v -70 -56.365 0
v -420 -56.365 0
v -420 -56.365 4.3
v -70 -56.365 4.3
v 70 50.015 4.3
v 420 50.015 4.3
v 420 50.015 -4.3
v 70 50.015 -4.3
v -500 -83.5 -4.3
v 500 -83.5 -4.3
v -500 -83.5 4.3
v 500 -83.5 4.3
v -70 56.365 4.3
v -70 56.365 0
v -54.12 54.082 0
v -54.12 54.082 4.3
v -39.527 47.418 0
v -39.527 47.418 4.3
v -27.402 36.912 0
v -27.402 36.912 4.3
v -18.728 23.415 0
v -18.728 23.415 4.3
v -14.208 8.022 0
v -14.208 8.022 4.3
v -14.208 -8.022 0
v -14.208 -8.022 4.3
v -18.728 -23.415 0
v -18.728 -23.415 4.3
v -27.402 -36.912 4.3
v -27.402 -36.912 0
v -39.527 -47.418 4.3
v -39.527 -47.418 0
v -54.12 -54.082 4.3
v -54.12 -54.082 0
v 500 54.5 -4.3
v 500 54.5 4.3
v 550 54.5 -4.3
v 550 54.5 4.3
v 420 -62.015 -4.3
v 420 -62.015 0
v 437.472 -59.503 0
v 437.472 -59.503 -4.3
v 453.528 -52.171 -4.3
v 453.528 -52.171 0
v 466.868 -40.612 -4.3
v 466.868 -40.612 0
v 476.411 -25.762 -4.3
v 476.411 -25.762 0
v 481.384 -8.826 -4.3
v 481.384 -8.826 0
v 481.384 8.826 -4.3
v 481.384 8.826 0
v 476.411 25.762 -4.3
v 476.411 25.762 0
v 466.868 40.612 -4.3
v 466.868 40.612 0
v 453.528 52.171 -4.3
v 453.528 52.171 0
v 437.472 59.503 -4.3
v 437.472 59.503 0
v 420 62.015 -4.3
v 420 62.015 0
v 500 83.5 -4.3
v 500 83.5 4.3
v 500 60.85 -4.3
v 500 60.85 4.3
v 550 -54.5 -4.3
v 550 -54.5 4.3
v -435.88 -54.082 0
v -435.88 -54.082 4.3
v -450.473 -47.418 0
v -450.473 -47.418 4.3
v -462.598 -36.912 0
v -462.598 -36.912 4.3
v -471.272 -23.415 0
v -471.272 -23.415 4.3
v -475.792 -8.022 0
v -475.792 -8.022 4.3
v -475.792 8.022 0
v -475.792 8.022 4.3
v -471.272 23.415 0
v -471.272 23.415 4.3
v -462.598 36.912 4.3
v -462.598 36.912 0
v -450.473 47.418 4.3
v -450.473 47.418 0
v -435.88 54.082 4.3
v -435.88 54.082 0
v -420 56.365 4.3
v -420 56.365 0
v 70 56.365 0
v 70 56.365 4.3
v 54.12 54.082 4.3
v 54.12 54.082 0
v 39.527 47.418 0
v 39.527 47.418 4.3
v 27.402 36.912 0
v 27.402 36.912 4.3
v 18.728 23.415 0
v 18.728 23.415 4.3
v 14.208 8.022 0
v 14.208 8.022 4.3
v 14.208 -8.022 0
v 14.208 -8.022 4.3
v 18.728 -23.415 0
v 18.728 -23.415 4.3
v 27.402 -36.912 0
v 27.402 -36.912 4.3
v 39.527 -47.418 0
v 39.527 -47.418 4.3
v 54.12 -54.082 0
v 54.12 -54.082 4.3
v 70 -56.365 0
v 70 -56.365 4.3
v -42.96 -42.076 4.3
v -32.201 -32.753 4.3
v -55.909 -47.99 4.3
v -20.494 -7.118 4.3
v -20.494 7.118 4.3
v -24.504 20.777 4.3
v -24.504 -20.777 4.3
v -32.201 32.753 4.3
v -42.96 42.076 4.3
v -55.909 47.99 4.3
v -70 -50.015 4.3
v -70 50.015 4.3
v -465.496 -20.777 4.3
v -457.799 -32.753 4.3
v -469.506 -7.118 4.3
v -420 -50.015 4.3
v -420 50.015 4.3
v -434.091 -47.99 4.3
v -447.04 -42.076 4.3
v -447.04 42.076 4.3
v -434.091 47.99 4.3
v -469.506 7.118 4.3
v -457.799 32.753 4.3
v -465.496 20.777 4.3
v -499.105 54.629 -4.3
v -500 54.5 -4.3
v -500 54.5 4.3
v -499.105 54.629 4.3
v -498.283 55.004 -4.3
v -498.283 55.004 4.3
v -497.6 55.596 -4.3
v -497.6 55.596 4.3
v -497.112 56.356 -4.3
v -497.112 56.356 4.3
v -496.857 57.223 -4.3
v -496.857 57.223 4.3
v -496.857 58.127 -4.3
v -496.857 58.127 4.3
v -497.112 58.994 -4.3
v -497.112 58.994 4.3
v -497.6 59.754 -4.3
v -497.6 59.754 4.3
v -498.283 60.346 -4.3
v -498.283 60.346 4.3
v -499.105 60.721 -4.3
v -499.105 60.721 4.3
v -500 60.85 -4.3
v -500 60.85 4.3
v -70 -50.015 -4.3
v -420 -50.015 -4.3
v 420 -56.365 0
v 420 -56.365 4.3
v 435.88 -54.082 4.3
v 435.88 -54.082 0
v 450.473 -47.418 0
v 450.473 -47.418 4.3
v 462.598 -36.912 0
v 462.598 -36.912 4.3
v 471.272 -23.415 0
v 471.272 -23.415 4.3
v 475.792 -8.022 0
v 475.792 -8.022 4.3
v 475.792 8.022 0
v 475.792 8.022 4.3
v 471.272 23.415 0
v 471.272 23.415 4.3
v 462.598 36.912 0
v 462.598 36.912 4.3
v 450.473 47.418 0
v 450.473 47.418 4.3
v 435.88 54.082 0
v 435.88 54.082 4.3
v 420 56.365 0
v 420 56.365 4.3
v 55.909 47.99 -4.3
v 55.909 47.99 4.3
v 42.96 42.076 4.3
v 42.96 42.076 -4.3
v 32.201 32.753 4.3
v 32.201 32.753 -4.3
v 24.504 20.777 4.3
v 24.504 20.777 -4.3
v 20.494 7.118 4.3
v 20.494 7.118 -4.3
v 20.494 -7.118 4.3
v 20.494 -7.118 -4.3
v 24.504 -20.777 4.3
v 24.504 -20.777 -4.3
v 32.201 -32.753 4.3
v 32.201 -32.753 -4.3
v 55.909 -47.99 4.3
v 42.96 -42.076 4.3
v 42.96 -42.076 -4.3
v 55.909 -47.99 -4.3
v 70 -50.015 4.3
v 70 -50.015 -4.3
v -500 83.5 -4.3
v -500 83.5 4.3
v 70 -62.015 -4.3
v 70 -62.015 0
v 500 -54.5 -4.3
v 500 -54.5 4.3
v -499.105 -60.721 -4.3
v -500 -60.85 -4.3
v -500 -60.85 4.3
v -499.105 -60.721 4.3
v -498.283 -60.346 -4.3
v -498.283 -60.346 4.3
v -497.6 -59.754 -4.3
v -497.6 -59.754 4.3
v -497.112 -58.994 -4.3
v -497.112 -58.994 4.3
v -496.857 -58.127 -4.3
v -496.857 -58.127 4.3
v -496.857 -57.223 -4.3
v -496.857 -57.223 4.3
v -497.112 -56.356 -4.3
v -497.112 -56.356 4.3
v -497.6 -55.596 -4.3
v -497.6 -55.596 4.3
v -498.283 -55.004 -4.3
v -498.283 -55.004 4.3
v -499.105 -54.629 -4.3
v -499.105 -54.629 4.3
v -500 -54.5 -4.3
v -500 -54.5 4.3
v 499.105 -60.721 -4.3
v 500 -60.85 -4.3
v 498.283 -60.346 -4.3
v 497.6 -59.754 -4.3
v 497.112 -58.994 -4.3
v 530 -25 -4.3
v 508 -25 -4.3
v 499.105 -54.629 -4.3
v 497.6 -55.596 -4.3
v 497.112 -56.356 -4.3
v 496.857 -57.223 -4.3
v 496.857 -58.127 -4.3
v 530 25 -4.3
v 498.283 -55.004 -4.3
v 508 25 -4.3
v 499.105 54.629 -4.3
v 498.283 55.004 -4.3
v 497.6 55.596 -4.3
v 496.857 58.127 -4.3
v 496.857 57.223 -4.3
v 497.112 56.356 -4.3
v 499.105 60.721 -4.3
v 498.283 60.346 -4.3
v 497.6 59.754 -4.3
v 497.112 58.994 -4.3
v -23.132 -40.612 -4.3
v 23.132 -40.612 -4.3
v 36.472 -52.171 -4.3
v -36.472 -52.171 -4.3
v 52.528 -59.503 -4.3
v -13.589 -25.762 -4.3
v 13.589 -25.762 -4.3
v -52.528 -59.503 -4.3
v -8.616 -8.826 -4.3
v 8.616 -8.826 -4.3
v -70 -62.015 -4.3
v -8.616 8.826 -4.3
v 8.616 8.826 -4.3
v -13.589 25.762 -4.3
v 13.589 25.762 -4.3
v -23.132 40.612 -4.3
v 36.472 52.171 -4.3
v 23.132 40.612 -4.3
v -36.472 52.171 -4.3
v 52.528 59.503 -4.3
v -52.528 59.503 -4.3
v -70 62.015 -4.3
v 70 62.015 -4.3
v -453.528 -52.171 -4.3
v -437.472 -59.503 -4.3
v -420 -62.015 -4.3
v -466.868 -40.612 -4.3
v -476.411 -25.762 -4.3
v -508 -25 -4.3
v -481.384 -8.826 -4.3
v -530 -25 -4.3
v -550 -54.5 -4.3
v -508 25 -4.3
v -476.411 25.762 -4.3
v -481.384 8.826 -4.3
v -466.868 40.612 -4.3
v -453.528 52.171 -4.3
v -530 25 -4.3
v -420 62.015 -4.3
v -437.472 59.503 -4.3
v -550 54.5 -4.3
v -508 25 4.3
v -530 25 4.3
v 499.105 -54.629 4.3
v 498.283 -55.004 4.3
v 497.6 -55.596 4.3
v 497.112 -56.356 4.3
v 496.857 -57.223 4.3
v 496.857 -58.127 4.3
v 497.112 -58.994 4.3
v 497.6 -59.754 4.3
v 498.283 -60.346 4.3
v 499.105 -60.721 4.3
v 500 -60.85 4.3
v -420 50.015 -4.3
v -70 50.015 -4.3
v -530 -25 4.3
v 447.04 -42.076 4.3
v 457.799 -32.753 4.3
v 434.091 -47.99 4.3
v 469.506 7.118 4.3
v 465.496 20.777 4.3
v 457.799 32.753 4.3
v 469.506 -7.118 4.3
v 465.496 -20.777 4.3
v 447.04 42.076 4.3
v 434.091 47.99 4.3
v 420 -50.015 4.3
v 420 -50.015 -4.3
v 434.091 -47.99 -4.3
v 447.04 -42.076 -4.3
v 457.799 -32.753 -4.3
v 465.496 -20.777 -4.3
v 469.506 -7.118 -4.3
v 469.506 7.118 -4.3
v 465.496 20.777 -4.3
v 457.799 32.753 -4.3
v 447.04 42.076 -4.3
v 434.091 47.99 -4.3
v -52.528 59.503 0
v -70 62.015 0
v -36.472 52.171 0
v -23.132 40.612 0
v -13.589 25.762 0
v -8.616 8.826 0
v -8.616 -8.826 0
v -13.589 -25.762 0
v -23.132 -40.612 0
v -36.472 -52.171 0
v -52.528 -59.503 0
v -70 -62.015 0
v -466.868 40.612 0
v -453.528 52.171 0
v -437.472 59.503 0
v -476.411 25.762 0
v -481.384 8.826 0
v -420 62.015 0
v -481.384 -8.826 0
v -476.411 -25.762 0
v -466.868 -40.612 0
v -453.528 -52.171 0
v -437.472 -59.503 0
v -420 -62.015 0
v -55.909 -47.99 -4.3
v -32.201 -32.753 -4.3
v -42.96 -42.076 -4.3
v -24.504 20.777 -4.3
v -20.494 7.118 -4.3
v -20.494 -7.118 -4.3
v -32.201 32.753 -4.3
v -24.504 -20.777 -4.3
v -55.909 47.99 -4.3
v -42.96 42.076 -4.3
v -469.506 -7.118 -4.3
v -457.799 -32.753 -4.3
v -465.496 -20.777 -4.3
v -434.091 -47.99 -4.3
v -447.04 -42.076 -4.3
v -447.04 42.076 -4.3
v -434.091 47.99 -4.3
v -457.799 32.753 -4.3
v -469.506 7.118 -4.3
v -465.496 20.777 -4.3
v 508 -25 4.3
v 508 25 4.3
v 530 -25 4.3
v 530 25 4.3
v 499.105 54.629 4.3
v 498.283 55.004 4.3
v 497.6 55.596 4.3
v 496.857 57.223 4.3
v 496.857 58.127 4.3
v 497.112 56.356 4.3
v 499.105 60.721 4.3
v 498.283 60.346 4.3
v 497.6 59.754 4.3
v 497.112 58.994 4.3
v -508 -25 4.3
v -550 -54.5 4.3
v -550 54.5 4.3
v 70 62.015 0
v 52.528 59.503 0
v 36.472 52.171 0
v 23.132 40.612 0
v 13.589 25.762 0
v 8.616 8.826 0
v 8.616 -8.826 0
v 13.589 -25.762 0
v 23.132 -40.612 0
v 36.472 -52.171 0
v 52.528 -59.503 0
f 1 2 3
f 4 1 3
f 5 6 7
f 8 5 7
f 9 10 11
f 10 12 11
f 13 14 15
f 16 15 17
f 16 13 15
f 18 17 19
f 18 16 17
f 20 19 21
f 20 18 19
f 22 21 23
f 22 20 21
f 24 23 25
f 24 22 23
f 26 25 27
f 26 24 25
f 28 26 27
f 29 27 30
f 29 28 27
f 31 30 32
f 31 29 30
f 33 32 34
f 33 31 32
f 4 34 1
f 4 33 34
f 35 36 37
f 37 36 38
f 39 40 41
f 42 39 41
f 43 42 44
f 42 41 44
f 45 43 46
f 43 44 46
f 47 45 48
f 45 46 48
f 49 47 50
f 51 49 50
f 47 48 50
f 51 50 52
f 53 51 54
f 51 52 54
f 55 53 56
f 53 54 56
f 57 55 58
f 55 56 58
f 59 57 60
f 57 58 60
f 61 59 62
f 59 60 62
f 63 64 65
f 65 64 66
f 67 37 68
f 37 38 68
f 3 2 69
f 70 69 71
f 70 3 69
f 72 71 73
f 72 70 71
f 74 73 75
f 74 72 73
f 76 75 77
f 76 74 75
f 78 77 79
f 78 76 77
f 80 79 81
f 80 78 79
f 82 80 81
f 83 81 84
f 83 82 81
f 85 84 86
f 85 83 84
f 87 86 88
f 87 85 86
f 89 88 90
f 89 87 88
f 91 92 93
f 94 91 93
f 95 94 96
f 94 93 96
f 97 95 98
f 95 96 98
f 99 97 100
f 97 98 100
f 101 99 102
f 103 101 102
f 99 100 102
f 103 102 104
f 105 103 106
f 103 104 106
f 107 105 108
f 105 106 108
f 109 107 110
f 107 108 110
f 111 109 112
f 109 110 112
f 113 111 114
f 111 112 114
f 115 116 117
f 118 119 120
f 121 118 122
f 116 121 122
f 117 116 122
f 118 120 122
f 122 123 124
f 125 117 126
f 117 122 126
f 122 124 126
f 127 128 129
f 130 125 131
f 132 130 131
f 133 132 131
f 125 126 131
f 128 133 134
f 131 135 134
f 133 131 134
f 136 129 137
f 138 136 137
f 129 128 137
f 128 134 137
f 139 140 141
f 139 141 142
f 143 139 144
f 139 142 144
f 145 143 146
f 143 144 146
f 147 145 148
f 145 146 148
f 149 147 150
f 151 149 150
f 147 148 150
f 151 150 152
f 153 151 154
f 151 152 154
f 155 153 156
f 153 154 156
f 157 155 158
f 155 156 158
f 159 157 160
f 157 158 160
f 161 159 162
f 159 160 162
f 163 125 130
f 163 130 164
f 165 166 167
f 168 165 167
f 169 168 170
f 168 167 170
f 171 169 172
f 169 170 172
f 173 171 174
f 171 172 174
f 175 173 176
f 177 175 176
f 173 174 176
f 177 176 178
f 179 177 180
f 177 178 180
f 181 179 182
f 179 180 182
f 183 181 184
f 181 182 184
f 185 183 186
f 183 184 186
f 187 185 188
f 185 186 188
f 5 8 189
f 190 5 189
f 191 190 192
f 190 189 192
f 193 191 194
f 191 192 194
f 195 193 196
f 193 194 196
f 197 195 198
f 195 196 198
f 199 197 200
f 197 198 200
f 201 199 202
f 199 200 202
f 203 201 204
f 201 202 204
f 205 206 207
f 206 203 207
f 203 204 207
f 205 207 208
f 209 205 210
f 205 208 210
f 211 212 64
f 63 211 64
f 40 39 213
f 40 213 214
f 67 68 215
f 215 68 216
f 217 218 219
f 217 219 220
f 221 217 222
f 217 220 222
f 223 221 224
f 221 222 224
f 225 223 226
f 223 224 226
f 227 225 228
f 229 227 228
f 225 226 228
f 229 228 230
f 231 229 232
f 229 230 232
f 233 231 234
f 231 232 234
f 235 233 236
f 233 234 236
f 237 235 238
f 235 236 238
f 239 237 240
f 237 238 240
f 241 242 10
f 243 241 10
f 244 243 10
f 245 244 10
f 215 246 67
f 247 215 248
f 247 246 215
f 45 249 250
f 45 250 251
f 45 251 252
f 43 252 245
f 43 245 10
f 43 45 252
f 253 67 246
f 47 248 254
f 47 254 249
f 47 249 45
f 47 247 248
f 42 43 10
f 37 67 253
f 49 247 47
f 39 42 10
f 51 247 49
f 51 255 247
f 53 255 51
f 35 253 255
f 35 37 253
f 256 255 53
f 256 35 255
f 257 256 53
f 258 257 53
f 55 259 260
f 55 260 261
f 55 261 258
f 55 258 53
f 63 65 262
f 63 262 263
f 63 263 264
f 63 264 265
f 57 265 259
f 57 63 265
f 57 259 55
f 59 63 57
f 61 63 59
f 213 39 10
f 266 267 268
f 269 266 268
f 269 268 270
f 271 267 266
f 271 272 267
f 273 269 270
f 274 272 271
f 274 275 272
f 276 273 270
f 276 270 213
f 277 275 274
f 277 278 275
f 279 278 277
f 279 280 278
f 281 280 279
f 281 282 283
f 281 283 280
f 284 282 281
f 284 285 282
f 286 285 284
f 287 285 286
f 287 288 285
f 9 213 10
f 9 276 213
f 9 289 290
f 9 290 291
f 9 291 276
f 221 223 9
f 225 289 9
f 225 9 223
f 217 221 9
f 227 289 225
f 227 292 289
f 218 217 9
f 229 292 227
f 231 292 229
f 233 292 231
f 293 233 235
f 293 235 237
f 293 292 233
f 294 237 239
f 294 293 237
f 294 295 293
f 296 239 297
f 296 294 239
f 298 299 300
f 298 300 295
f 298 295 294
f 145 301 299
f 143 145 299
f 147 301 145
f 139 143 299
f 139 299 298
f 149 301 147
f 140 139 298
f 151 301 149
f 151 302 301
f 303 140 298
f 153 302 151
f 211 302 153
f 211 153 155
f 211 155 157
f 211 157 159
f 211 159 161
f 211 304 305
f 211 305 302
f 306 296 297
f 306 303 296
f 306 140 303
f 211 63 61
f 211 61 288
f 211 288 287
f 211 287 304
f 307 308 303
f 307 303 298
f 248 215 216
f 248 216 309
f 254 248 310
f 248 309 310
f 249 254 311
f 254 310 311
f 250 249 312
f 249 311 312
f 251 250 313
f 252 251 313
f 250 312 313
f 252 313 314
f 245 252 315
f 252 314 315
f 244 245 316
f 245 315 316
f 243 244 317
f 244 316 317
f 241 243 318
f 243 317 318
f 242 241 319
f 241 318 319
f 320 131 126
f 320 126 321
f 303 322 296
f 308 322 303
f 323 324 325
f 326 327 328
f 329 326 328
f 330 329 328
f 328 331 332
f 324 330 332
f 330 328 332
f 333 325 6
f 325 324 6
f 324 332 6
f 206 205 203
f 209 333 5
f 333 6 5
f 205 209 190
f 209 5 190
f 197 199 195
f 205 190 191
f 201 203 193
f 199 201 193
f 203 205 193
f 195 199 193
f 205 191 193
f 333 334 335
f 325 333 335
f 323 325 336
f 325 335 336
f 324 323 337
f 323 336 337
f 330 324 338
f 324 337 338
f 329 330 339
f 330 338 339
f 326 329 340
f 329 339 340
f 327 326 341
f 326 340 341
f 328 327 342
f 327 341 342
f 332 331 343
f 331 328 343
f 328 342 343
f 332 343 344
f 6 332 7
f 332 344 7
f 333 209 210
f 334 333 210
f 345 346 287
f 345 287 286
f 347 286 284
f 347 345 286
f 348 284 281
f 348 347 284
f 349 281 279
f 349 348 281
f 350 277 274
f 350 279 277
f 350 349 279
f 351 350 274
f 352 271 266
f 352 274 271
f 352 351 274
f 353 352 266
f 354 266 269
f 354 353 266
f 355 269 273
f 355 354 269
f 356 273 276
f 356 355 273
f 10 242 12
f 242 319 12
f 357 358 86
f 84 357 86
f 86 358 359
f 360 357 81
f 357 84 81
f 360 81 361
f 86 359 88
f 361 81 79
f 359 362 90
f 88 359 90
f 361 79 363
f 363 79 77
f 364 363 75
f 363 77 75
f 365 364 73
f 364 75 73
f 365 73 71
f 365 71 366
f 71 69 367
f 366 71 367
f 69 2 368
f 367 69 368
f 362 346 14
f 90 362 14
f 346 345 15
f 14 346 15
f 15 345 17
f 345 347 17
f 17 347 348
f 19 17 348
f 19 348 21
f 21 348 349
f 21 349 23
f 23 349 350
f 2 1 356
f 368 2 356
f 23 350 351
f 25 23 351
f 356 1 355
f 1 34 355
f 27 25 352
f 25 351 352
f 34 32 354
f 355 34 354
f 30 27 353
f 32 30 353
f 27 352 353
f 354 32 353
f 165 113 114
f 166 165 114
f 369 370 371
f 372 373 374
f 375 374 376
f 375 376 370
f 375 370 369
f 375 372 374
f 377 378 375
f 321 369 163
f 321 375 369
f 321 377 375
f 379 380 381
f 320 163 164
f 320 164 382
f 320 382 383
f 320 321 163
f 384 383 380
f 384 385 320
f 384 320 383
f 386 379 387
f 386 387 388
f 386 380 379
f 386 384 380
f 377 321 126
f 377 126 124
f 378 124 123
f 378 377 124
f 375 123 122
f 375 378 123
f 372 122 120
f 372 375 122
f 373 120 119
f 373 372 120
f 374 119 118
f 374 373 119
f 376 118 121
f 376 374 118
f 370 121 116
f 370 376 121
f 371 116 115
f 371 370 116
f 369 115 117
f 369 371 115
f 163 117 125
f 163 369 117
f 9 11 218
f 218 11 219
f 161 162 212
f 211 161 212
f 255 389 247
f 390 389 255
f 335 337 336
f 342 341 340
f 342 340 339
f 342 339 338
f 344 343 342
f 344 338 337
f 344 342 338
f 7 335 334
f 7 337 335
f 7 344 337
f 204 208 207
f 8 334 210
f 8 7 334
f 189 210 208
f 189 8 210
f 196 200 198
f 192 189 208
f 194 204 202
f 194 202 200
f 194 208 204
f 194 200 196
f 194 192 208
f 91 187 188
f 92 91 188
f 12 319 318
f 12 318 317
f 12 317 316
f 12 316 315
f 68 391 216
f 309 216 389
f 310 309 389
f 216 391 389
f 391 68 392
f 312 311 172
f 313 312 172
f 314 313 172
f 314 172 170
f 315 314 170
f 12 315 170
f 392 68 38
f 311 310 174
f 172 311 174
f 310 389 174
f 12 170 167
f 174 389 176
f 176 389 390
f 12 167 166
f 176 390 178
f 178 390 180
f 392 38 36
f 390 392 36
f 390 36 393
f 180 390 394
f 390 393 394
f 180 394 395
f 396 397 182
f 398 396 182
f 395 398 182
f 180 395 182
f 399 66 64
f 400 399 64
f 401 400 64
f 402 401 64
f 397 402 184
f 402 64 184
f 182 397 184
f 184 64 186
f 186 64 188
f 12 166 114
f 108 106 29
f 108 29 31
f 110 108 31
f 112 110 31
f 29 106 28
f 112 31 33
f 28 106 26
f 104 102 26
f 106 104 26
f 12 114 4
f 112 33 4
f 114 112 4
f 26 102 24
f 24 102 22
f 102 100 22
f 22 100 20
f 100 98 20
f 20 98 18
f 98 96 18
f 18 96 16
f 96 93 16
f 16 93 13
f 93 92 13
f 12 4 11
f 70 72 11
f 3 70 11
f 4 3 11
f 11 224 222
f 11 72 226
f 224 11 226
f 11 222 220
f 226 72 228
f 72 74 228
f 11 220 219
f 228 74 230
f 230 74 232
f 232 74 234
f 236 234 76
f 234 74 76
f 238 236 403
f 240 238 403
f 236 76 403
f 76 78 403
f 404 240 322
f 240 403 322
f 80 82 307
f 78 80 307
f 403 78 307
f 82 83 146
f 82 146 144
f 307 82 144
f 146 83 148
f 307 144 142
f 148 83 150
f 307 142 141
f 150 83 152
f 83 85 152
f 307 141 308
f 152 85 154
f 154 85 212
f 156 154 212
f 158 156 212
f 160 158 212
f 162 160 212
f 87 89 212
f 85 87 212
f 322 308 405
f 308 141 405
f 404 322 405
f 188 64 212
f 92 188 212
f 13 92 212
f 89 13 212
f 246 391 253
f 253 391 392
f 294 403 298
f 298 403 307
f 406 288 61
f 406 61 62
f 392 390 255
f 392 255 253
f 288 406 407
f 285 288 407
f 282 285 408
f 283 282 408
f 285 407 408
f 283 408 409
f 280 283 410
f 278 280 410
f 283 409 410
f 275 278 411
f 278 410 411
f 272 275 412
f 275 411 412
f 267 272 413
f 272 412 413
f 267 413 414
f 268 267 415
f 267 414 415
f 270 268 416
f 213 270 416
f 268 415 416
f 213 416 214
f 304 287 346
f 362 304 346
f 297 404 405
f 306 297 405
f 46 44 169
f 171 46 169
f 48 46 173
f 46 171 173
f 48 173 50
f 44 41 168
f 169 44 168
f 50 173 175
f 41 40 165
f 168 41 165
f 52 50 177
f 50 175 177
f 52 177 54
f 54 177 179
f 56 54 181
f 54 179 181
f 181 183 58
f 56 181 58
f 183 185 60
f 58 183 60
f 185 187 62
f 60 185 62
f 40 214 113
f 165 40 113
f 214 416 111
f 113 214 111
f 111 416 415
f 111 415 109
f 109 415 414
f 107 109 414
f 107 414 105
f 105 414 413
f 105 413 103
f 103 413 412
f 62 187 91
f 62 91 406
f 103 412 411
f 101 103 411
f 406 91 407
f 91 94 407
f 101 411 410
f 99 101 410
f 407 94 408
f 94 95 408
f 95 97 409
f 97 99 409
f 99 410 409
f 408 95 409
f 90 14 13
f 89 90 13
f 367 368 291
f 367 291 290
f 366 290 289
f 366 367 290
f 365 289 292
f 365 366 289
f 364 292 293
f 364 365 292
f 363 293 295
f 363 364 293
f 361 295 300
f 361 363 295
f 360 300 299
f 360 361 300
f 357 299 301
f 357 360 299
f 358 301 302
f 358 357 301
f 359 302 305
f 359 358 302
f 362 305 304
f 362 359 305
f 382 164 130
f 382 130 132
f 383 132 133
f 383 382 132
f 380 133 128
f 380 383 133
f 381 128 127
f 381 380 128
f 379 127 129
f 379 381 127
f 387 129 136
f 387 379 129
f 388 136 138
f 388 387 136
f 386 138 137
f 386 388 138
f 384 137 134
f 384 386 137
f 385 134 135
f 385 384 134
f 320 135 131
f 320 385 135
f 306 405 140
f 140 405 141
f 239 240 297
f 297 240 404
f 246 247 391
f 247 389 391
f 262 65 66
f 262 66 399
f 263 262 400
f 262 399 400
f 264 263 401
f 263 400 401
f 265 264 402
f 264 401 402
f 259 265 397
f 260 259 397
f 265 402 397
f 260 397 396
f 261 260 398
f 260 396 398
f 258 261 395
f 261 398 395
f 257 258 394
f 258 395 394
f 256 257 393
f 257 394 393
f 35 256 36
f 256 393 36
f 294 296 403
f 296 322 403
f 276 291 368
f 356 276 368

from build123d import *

# Parameters (mm, degrees)
SKETCH1_W           = 22
SKETCH1_H           = 50
BOSS_EXTRUDE1_DEPTH = 4.3


with BuildPart() as part:
    # Sketch1 → Boss-Extrude1 (new body, symmetric)
    with BuildSketch(Plane.XY):
        with BuildLine():
            Line((-500, 83.5), (500, 83.5))
            Line((500, 83.5), (500, 60.85))
            ThreePointArc((500, 60.85), (496.825, 57.675), (500, 54.5))
            Line((500, 54.5), (550, 54.5))
            Line((550, 54.5), (550, -54.5))
            Line((550, -54.5), (500, -54.5))
            ThreePointArc((500, -54.5), (496.825, -57.675), (500, -60.85))
            Line((500, -60.85), (500, -83.5))
            Line((500, -83.5), (-500, -83.5))
            Line((-500, -83.5), (-500, -60.85))
            ThreePointArc((-500, -60.85), (-496.825, -57.675), (-500, -54.5))
            Line((-500, -54.5), (-550, -54.5))
            Line((-550, -54.5), (-550, 54.5))
            Line((-550, 54.5), (-500, 54.5))
            ThreePointArc((-500, 54.5), (-496.825, 57.675), (-500, 60.85))
            Line((-500, 60.85), (-500, 83.5))
        make_face()
        with Locations((519, 0)):
            Rectangle(SKETCH1_W, SKETCH1_H, mode=Mode.SUBTRACT)
        with Locations((-519, 0)):
            Rectangle(SKETCH1_W, SKETCH1_H, mode=Mode.SUBTRACT)
    extrude(amount=BOSS_EXTRUDE1_DEPTH, both=True)

    # Cut-Sweep1: sweep along a path in Sketch2
    with BuildLine(Plane.XY) as cut_sweep1_path:
        Line((-420, 50), (-70, 50))
        ThreePointArc((-70, 50), (-20, 0), (-70, -50))
        Line((-70, -50), (-420, -50))
        ThreePointArc((-420, -50), (-470, 0), (-420, 50))
    # Sketch3 → Cut-Sweep1 (sweep, cut)
    with BuildSketch(Plane(origin=(-420, 0, 0), x_dir=(0, 0, -1), z_dir=(1, 0, 0))):
        Polygon((0, 62.015479753), (0, 57.679593212), (0, 56.365479753), (-6, 56.365479753), (-6, 50.015479753), (6, 50.015479753), (6, 62.015479753), align=None)
    sweep(path=cut_sweep1_path.line, mode=Mode.SUBTRACT)

    # Cut-Sweep2: sweep along a path in Sketch2_3
    with BuildLine(Plane.XY) as cut_sweep2_path:
        Line((420, 50), (70, 50))
        ThreePointArc((70, 50), (20, 0), (70, -50))
        Line((70, -50), (420, -50))
        ThreePointArc((420, -50), (470, 0), (420, 50))
    # Sketch4 → Cut-Sweep2 (sweep, cut)
    with BuildSketch(Plane(origin=(420, 0, 0), x_dir=(0, 0, -1), z_dir=(1, 0, 0))):
        Polygon((-6, 50.015479753), (-6, 56.365479753), (0, 56.365479753), (0, 62.015479753), (6, 62.015479753), (6, 50.015479753), align=None)
    sweep(path=cut_sweep2_path.line, mode=Mode.SUBTRACT)


solid = part.part
